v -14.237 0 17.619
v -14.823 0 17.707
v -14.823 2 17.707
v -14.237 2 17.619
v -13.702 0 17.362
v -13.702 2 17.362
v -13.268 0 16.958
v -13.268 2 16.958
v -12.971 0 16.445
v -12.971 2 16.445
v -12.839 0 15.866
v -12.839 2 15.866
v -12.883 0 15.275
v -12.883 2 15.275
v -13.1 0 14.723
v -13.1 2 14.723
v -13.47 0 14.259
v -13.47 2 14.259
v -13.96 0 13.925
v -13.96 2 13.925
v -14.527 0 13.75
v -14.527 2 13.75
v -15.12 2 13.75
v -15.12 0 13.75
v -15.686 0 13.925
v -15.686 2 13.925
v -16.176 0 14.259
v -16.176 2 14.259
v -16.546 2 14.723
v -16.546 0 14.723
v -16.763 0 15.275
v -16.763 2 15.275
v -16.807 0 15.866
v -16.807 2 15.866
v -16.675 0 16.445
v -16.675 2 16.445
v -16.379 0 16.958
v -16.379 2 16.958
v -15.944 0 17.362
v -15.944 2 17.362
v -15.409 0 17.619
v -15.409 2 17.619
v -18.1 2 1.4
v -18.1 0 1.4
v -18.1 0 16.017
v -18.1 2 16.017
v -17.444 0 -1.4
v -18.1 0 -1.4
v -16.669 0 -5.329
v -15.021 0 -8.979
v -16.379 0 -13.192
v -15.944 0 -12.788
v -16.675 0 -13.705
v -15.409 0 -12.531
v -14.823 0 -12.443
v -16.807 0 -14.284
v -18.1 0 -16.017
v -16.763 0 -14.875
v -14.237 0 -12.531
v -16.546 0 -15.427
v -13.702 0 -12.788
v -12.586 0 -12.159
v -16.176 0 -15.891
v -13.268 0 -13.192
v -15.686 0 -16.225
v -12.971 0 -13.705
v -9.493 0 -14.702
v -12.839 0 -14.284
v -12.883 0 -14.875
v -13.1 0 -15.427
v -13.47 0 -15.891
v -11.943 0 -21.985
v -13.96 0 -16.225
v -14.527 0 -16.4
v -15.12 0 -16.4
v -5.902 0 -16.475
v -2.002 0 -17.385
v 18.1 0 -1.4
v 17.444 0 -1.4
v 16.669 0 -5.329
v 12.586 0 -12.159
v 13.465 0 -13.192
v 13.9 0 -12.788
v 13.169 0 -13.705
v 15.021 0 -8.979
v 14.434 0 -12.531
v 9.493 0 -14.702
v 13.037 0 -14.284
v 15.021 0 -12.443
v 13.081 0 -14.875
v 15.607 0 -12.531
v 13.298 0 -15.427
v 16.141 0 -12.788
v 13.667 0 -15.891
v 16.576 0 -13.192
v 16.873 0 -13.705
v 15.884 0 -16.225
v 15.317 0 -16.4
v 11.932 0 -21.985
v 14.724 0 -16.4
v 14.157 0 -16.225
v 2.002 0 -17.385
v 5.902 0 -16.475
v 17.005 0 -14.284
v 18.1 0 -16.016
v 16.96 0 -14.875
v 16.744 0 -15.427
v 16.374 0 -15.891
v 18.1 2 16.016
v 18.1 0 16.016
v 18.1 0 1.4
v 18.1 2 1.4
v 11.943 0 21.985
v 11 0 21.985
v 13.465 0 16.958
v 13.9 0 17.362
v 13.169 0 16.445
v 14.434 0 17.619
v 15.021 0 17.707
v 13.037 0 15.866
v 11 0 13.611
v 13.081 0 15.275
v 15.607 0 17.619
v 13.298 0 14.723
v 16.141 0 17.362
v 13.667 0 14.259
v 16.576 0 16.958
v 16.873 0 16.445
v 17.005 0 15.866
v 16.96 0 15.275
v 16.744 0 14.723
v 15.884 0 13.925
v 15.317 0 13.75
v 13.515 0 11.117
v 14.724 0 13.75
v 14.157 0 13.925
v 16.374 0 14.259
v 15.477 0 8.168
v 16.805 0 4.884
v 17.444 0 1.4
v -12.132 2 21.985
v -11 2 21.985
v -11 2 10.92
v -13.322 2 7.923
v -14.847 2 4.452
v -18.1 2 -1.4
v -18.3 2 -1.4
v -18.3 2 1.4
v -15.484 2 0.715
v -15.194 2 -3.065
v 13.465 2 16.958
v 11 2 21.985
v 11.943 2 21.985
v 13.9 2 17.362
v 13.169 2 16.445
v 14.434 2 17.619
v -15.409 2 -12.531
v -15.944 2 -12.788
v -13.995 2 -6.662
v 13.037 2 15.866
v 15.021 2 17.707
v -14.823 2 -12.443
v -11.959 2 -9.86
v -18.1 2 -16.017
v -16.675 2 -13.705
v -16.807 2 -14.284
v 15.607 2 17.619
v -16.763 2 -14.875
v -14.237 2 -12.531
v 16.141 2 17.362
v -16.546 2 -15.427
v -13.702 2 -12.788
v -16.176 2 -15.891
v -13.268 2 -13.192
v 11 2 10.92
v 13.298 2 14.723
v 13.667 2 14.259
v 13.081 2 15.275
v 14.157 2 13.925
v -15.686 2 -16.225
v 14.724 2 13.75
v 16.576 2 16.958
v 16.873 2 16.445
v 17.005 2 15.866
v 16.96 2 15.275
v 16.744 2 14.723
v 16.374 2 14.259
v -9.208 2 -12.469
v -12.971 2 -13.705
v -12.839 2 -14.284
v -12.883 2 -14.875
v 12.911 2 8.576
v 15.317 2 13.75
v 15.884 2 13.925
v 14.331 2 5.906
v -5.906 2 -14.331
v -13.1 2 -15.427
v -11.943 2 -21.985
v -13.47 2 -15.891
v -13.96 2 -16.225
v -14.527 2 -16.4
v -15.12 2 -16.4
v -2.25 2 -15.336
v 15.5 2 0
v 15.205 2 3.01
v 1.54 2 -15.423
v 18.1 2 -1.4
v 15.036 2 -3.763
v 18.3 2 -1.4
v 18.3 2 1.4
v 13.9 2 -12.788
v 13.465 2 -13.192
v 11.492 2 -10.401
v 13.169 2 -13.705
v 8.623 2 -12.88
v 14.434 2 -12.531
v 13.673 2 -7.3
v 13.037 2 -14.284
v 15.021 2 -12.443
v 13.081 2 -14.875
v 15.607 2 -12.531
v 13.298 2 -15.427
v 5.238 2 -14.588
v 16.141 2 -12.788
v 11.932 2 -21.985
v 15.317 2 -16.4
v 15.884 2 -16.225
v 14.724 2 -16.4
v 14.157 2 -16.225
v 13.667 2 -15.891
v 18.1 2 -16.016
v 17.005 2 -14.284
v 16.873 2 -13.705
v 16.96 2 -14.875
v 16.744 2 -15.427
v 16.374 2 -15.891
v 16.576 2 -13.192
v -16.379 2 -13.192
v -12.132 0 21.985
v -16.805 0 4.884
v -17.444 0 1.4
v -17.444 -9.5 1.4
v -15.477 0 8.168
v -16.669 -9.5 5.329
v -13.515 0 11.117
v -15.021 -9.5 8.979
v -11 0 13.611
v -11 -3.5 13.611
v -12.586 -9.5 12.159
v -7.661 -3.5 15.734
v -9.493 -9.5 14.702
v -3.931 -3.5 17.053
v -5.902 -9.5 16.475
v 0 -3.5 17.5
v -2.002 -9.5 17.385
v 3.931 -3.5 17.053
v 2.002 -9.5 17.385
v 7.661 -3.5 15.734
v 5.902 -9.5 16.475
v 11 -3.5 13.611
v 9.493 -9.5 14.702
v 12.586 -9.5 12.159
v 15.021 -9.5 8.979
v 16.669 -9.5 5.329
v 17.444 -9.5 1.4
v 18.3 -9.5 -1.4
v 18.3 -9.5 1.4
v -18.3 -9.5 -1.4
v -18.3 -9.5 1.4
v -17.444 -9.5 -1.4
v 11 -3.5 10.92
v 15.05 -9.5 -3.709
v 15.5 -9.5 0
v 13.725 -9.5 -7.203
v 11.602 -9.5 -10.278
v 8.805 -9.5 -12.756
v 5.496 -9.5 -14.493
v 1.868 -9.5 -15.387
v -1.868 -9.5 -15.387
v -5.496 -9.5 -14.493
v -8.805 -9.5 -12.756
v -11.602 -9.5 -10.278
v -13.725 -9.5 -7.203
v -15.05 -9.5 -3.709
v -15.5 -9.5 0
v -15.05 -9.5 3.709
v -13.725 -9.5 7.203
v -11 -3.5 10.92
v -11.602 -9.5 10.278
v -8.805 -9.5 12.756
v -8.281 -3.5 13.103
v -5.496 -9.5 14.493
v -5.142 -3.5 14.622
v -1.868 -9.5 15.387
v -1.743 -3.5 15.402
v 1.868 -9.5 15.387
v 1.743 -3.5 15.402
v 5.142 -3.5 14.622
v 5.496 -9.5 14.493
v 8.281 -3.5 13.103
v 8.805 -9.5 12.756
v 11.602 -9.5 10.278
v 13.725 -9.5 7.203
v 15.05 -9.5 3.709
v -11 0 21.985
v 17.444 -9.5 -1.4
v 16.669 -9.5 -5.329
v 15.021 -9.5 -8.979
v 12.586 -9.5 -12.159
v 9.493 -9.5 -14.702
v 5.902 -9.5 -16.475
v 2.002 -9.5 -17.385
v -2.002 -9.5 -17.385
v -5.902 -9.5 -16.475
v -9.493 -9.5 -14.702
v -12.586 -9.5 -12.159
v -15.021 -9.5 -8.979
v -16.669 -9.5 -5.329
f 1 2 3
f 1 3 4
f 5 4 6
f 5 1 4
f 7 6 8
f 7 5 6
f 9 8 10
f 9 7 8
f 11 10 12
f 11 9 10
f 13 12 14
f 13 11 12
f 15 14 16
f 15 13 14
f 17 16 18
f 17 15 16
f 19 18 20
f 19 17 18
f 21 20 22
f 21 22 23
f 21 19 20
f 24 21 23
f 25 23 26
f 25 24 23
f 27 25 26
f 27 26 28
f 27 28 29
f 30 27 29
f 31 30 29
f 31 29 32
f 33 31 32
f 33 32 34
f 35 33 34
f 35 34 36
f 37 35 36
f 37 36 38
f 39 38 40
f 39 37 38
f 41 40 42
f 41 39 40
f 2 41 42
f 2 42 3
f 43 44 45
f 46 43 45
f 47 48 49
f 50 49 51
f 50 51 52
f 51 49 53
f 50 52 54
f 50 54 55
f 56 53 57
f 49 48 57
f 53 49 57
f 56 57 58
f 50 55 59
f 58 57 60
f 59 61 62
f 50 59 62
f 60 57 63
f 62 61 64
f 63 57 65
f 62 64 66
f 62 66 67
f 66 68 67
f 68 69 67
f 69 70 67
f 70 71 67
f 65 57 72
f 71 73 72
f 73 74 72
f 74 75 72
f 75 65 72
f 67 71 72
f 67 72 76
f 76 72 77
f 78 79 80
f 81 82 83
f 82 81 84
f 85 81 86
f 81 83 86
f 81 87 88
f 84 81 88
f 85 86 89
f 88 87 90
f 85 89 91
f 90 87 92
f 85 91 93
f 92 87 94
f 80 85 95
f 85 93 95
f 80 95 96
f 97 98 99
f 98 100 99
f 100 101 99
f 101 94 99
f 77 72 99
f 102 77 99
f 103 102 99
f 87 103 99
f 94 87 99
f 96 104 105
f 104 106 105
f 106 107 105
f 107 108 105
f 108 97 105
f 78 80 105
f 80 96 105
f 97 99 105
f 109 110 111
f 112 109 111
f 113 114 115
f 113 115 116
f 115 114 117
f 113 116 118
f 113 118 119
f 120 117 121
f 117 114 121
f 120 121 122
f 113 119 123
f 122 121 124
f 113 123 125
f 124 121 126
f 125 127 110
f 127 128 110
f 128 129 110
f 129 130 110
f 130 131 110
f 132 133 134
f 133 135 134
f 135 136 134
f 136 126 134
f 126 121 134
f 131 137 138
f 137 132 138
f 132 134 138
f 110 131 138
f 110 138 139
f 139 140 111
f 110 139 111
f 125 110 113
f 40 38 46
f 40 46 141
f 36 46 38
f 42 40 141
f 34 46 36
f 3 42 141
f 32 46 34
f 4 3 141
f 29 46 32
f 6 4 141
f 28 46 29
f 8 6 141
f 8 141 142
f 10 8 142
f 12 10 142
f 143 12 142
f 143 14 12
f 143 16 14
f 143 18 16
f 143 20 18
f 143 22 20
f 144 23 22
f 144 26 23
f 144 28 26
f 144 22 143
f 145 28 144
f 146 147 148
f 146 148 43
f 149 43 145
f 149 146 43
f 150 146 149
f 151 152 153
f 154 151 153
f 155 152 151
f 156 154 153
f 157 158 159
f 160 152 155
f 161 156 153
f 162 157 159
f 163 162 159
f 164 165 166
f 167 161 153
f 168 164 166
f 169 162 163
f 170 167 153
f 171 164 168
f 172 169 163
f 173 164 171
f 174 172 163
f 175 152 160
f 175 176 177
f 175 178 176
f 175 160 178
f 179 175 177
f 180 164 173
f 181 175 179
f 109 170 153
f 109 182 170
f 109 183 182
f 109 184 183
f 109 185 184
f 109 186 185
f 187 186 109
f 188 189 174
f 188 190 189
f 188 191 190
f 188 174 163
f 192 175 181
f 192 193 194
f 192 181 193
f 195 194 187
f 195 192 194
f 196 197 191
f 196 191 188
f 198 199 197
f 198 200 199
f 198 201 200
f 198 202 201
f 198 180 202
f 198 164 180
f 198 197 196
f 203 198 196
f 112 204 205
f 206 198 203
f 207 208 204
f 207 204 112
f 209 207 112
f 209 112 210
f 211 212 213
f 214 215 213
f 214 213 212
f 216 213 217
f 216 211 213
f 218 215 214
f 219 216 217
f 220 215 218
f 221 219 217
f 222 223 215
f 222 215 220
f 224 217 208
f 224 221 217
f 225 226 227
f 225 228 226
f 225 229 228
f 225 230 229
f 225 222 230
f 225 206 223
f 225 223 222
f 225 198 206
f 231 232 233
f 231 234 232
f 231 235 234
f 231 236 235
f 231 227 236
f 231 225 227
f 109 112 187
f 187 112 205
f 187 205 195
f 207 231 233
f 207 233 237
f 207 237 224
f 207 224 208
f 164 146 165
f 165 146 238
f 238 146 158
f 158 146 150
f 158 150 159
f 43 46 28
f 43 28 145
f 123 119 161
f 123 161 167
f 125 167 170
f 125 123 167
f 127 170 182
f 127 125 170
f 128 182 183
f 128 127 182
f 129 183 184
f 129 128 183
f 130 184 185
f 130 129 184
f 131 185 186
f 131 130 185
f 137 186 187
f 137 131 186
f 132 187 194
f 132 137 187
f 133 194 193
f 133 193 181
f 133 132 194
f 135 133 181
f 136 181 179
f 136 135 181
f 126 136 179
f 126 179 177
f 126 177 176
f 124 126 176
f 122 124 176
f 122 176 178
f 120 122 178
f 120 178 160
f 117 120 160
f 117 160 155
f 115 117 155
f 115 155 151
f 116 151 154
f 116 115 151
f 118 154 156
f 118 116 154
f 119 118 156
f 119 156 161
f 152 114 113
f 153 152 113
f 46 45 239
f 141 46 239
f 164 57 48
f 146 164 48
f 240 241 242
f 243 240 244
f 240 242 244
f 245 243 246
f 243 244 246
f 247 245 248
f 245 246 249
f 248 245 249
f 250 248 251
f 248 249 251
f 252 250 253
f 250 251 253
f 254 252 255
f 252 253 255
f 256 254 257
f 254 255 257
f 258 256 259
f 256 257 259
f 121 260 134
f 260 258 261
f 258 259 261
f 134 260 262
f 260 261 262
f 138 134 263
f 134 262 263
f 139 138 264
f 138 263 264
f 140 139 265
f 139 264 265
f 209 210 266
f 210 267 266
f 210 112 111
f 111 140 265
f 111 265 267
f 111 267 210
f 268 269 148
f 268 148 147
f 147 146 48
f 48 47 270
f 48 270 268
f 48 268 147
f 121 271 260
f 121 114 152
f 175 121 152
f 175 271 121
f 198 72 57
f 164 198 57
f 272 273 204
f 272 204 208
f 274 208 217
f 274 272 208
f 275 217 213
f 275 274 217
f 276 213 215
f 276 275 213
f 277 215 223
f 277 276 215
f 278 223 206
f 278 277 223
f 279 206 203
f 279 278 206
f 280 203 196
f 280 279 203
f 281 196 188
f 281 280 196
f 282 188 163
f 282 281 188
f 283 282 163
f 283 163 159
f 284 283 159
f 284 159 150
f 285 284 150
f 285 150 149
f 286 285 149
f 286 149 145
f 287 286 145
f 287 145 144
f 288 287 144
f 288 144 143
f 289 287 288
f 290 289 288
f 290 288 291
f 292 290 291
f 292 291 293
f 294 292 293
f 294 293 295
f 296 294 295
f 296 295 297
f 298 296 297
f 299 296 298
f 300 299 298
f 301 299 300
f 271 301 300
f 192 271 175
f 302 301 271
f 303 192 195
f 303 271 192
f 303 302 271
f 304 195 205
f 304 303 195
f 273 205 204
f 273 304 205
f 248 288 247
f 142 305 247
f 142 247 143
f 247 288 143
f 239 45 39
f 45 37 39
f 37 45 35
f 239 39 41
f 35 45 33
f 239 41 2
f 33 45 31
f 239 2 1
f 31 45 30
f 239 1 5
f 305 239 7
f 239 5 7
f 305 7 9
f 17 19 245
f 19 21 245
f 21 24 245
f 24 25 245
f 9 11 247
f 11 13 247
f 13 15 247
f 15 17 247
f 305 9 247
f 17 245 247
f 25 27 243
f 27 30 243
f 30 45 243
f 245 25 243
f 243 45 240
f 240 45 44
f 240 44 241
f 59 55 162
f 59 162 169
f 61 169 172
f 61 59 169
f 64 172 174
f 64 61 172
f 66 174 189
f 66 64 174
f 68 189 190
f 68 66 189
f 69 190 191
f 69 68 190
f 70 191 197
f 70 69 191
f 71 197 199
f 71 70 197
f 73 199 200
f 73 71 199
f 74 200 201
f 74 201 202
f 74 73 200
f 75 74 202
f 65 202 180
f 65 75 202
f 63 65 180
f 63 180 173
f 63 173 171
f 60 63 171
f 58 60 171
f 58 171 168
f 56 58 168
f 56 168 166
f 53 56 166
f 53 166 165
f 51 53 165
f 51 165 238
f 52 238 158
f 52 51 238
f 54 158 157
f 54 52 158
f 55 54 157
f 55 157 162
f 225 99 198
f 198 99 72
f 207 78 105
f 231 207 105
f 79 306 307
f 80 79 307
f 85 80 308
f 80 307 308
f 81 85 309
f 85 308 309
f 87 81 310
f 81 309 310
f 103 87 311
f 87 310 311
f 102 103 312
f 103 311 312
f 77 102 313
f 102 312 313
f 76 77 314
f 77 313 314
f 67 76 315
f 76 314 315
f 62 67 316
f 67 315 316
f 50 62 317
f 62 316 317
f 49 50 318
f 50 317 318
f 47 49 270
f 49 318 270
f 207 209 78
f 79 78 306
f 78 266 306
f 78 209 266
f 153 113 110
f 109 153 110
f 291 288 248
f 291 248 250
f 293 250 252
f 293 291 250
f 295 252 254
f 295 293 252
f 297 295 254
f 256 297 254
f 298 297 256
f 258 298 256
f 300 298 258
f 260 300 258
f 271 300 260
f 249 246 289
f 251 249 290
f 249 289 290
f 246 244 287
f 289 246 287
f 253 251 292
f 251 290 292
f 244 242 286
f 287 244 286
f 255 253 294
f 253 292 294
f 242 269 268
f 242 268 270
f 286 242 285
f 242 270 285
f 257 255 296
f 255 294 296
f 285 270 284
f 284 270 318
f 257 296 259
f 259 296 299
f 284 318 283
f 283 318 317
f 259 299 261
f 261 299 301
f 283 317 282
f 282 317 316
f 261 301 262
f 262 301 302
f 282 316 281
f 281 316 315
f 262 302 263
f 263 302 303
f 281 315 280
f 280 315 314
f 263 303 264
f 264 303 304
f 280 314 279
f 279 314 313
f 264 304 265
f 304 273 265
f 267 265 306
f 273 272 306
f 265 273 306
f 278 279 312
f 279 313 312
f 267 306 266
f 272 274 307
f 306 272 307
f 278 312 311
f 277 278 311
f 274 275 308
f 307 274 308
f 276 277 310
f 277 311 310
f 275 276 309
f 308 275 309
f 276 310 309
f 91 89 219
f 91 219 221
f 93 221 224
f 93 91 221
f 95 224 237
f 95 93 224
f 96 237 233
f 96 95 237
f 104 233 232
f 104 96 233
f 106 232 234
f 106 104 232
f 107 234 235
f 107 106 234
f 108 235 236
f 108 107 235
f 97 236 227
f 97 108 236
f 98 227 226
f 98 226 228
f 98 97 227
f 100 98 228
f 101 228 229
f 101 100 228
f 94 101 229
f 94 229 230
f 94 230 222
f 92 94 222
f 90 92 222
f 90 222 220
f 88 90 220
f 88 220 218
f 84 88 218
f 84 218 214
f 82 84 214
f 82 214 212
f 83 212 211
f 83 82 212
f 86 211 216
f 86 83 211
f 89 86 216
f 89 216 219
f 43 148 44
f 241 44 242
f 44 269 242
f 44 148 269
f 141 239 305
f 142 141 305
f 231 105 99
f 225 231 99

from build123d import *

# Parameters (mm, degrees)
SKETCH1_R              = 17.5
SKETCH1_R_2            = 1.989574321
BOSS_EXTRUDE1_DEPTH    = 2
EXTRUDE_THIN1_START    = -9.5
SKETCH1_3_R            = 17.5
SKETCH1_3_R_2          = 15.5
EXTRUDE_THIN1_DEPTH    = 11.5
BOSS_EXTRUDE2_START    = -9.5
SKETCH1_4_W            = 0.2
SKETCH1_4_H            = 2.8
BOSS_EXTRUDE2_DEPTH    = 9.5
CUT_EXTRUDE1_START     = -11.064631417
CUT_EXTRUDE1_OUTLINE_W = 22
CUT_EXTRUDE1_OUTLINE_H = 5.5
CUT_EXTRUDE1_DEPTH     = 11.064631417


# Read off the part's stored shape, not the designer's step: Cut-Extrude1
with BuildPart() as part:
    # Sketch1 → Boss-Extrude1 (new body)
    with BuildSketch(Plane(origin=(0, 0, 0), x_dir=(1, 0, 0), z_dir=(0, 1, 0))):
        Polygon((-18.1, -16.016775893), (-12.131979642, -21.984796251), (11.942572252, -21.984796251), (18.1, -16.016073287), (18.1, -1.4), (18.3, -1.4), (18.3, 1.4), (18.1, 1.4), (18.1, 16.016073287), (11.932319604, 21.984796251), (-11.943274858, 21.984796251), (-18.1, 16.01675436), (-18.1, 1.4), (-18.3, 1.4), (-18.3, -1.4), (-18.1, -1.4), align=None)
        with Locations(Location((0, 0, 0), (0, 0, 270))):
            Circle(SKETCH1_R, mode=Mode.SUBTRACT)
        with Locations(Location((-14.8230313, -15.717637138, 0), (0, 0, 270))):
            Circle(SKETCH1_R_2, mode=Mode.SUBTRACT)
        with Locations(Location((15.02058352, -15.717637138, 0), (0, 0, 270))):
            Circle(SKETCH1_R_2, mode=Mode.SUBTRACT)
        with Locations(Location((-14.8230313, 14.432362862, 0), (0, 0, 270))):
            Circle(SKETCH1_R_2, mode=Mode.SUBTRACT)
        with Locations(Location((15.02058352, 14.432362862, 0), (0, 0, 270))):
            Circle(SKETCH1_R_2, mode=Mode.SUBTRACT)
    extrude(amount=BOSS_EXTRUDE1_DEPTH)

    # Sketch1<3> → Extrude-Thin1 (add)
    with BuildSketch(Plane(origin=(0, 0, 0), x_dir=(1, 0, 0), z_dir=(0, 1, 0)).offset(EXTRUDE_THIN1_START)):
        Circle(SKETCH1_3_R)
        Circle(SKETCH1_3_R_2, mode=Mode.SUBTRACT)
    extrude(amount=EXTRUDE_THIN1_DEPTH)

    # Sketch1<4> → Boss-Extrude2 (add)
    with BuildSketch(Plane(origin=(0, 0, 0), x_dir=(1, 0, 0), z_dir=(0, 1, 0)).offset(BOSS_EXTRUDE2_START)):
        with Locations((-18.2, 0)):
            Rectangle(SKETCH1_4_W, SKETCH1_4_H)
        with Locations((18.2, 0)):
            Rectangle(SKETCH1_4_W, SKETCH1_4_H)
        with BuildLine():
            ThreePointArc((17.5, 0), (17.485971906, -0.700561574), (17.443910112, -1.4))
            Line((17.443910112, -1.4), (18.1, -1.4))
            Line((18.1, -1.4), (18.1, 1.4))
            Line((18.1, 1.4), (17.443910112, 1.4))
            ThreePointArc((17.443910112, 1.4), (17.485971906, 0.700561574), (17.5, 0))
        make_face()
        with BuildLine():
            Line((-18.1, 1.4), (-18.1, -1.4))
            Line((-18.1, -1.4), (-17.443910112, -1.4))
            ThreePointArc((-17.443910112, -1.4), (-17.5, 0), (-17.443910112, 1.4))
            Line((-17.443910112, 1.4), (-18.1, 1.4))
        make_face()
    extrude(amount=BOSS_EXTRUDE2_DEPTH)

    # Cut-Extrude1 outline → Cut-Extrude1 (cut)
    with BuildSketch(Plane.XY.offset(21.984796251).offset(CUT_EXTRUDE1_START)):
        with Locations((0, -0.75)):
            Rectangle(CUT_EXTRUDE1_OUTLINE_W, CUT_EXTRUDE1_OUTLINE_H)
    extrude(amount=CUT_EXTRUDE1_DEPTH, mode=Mode.SUBTRACT)


solid = part.part
